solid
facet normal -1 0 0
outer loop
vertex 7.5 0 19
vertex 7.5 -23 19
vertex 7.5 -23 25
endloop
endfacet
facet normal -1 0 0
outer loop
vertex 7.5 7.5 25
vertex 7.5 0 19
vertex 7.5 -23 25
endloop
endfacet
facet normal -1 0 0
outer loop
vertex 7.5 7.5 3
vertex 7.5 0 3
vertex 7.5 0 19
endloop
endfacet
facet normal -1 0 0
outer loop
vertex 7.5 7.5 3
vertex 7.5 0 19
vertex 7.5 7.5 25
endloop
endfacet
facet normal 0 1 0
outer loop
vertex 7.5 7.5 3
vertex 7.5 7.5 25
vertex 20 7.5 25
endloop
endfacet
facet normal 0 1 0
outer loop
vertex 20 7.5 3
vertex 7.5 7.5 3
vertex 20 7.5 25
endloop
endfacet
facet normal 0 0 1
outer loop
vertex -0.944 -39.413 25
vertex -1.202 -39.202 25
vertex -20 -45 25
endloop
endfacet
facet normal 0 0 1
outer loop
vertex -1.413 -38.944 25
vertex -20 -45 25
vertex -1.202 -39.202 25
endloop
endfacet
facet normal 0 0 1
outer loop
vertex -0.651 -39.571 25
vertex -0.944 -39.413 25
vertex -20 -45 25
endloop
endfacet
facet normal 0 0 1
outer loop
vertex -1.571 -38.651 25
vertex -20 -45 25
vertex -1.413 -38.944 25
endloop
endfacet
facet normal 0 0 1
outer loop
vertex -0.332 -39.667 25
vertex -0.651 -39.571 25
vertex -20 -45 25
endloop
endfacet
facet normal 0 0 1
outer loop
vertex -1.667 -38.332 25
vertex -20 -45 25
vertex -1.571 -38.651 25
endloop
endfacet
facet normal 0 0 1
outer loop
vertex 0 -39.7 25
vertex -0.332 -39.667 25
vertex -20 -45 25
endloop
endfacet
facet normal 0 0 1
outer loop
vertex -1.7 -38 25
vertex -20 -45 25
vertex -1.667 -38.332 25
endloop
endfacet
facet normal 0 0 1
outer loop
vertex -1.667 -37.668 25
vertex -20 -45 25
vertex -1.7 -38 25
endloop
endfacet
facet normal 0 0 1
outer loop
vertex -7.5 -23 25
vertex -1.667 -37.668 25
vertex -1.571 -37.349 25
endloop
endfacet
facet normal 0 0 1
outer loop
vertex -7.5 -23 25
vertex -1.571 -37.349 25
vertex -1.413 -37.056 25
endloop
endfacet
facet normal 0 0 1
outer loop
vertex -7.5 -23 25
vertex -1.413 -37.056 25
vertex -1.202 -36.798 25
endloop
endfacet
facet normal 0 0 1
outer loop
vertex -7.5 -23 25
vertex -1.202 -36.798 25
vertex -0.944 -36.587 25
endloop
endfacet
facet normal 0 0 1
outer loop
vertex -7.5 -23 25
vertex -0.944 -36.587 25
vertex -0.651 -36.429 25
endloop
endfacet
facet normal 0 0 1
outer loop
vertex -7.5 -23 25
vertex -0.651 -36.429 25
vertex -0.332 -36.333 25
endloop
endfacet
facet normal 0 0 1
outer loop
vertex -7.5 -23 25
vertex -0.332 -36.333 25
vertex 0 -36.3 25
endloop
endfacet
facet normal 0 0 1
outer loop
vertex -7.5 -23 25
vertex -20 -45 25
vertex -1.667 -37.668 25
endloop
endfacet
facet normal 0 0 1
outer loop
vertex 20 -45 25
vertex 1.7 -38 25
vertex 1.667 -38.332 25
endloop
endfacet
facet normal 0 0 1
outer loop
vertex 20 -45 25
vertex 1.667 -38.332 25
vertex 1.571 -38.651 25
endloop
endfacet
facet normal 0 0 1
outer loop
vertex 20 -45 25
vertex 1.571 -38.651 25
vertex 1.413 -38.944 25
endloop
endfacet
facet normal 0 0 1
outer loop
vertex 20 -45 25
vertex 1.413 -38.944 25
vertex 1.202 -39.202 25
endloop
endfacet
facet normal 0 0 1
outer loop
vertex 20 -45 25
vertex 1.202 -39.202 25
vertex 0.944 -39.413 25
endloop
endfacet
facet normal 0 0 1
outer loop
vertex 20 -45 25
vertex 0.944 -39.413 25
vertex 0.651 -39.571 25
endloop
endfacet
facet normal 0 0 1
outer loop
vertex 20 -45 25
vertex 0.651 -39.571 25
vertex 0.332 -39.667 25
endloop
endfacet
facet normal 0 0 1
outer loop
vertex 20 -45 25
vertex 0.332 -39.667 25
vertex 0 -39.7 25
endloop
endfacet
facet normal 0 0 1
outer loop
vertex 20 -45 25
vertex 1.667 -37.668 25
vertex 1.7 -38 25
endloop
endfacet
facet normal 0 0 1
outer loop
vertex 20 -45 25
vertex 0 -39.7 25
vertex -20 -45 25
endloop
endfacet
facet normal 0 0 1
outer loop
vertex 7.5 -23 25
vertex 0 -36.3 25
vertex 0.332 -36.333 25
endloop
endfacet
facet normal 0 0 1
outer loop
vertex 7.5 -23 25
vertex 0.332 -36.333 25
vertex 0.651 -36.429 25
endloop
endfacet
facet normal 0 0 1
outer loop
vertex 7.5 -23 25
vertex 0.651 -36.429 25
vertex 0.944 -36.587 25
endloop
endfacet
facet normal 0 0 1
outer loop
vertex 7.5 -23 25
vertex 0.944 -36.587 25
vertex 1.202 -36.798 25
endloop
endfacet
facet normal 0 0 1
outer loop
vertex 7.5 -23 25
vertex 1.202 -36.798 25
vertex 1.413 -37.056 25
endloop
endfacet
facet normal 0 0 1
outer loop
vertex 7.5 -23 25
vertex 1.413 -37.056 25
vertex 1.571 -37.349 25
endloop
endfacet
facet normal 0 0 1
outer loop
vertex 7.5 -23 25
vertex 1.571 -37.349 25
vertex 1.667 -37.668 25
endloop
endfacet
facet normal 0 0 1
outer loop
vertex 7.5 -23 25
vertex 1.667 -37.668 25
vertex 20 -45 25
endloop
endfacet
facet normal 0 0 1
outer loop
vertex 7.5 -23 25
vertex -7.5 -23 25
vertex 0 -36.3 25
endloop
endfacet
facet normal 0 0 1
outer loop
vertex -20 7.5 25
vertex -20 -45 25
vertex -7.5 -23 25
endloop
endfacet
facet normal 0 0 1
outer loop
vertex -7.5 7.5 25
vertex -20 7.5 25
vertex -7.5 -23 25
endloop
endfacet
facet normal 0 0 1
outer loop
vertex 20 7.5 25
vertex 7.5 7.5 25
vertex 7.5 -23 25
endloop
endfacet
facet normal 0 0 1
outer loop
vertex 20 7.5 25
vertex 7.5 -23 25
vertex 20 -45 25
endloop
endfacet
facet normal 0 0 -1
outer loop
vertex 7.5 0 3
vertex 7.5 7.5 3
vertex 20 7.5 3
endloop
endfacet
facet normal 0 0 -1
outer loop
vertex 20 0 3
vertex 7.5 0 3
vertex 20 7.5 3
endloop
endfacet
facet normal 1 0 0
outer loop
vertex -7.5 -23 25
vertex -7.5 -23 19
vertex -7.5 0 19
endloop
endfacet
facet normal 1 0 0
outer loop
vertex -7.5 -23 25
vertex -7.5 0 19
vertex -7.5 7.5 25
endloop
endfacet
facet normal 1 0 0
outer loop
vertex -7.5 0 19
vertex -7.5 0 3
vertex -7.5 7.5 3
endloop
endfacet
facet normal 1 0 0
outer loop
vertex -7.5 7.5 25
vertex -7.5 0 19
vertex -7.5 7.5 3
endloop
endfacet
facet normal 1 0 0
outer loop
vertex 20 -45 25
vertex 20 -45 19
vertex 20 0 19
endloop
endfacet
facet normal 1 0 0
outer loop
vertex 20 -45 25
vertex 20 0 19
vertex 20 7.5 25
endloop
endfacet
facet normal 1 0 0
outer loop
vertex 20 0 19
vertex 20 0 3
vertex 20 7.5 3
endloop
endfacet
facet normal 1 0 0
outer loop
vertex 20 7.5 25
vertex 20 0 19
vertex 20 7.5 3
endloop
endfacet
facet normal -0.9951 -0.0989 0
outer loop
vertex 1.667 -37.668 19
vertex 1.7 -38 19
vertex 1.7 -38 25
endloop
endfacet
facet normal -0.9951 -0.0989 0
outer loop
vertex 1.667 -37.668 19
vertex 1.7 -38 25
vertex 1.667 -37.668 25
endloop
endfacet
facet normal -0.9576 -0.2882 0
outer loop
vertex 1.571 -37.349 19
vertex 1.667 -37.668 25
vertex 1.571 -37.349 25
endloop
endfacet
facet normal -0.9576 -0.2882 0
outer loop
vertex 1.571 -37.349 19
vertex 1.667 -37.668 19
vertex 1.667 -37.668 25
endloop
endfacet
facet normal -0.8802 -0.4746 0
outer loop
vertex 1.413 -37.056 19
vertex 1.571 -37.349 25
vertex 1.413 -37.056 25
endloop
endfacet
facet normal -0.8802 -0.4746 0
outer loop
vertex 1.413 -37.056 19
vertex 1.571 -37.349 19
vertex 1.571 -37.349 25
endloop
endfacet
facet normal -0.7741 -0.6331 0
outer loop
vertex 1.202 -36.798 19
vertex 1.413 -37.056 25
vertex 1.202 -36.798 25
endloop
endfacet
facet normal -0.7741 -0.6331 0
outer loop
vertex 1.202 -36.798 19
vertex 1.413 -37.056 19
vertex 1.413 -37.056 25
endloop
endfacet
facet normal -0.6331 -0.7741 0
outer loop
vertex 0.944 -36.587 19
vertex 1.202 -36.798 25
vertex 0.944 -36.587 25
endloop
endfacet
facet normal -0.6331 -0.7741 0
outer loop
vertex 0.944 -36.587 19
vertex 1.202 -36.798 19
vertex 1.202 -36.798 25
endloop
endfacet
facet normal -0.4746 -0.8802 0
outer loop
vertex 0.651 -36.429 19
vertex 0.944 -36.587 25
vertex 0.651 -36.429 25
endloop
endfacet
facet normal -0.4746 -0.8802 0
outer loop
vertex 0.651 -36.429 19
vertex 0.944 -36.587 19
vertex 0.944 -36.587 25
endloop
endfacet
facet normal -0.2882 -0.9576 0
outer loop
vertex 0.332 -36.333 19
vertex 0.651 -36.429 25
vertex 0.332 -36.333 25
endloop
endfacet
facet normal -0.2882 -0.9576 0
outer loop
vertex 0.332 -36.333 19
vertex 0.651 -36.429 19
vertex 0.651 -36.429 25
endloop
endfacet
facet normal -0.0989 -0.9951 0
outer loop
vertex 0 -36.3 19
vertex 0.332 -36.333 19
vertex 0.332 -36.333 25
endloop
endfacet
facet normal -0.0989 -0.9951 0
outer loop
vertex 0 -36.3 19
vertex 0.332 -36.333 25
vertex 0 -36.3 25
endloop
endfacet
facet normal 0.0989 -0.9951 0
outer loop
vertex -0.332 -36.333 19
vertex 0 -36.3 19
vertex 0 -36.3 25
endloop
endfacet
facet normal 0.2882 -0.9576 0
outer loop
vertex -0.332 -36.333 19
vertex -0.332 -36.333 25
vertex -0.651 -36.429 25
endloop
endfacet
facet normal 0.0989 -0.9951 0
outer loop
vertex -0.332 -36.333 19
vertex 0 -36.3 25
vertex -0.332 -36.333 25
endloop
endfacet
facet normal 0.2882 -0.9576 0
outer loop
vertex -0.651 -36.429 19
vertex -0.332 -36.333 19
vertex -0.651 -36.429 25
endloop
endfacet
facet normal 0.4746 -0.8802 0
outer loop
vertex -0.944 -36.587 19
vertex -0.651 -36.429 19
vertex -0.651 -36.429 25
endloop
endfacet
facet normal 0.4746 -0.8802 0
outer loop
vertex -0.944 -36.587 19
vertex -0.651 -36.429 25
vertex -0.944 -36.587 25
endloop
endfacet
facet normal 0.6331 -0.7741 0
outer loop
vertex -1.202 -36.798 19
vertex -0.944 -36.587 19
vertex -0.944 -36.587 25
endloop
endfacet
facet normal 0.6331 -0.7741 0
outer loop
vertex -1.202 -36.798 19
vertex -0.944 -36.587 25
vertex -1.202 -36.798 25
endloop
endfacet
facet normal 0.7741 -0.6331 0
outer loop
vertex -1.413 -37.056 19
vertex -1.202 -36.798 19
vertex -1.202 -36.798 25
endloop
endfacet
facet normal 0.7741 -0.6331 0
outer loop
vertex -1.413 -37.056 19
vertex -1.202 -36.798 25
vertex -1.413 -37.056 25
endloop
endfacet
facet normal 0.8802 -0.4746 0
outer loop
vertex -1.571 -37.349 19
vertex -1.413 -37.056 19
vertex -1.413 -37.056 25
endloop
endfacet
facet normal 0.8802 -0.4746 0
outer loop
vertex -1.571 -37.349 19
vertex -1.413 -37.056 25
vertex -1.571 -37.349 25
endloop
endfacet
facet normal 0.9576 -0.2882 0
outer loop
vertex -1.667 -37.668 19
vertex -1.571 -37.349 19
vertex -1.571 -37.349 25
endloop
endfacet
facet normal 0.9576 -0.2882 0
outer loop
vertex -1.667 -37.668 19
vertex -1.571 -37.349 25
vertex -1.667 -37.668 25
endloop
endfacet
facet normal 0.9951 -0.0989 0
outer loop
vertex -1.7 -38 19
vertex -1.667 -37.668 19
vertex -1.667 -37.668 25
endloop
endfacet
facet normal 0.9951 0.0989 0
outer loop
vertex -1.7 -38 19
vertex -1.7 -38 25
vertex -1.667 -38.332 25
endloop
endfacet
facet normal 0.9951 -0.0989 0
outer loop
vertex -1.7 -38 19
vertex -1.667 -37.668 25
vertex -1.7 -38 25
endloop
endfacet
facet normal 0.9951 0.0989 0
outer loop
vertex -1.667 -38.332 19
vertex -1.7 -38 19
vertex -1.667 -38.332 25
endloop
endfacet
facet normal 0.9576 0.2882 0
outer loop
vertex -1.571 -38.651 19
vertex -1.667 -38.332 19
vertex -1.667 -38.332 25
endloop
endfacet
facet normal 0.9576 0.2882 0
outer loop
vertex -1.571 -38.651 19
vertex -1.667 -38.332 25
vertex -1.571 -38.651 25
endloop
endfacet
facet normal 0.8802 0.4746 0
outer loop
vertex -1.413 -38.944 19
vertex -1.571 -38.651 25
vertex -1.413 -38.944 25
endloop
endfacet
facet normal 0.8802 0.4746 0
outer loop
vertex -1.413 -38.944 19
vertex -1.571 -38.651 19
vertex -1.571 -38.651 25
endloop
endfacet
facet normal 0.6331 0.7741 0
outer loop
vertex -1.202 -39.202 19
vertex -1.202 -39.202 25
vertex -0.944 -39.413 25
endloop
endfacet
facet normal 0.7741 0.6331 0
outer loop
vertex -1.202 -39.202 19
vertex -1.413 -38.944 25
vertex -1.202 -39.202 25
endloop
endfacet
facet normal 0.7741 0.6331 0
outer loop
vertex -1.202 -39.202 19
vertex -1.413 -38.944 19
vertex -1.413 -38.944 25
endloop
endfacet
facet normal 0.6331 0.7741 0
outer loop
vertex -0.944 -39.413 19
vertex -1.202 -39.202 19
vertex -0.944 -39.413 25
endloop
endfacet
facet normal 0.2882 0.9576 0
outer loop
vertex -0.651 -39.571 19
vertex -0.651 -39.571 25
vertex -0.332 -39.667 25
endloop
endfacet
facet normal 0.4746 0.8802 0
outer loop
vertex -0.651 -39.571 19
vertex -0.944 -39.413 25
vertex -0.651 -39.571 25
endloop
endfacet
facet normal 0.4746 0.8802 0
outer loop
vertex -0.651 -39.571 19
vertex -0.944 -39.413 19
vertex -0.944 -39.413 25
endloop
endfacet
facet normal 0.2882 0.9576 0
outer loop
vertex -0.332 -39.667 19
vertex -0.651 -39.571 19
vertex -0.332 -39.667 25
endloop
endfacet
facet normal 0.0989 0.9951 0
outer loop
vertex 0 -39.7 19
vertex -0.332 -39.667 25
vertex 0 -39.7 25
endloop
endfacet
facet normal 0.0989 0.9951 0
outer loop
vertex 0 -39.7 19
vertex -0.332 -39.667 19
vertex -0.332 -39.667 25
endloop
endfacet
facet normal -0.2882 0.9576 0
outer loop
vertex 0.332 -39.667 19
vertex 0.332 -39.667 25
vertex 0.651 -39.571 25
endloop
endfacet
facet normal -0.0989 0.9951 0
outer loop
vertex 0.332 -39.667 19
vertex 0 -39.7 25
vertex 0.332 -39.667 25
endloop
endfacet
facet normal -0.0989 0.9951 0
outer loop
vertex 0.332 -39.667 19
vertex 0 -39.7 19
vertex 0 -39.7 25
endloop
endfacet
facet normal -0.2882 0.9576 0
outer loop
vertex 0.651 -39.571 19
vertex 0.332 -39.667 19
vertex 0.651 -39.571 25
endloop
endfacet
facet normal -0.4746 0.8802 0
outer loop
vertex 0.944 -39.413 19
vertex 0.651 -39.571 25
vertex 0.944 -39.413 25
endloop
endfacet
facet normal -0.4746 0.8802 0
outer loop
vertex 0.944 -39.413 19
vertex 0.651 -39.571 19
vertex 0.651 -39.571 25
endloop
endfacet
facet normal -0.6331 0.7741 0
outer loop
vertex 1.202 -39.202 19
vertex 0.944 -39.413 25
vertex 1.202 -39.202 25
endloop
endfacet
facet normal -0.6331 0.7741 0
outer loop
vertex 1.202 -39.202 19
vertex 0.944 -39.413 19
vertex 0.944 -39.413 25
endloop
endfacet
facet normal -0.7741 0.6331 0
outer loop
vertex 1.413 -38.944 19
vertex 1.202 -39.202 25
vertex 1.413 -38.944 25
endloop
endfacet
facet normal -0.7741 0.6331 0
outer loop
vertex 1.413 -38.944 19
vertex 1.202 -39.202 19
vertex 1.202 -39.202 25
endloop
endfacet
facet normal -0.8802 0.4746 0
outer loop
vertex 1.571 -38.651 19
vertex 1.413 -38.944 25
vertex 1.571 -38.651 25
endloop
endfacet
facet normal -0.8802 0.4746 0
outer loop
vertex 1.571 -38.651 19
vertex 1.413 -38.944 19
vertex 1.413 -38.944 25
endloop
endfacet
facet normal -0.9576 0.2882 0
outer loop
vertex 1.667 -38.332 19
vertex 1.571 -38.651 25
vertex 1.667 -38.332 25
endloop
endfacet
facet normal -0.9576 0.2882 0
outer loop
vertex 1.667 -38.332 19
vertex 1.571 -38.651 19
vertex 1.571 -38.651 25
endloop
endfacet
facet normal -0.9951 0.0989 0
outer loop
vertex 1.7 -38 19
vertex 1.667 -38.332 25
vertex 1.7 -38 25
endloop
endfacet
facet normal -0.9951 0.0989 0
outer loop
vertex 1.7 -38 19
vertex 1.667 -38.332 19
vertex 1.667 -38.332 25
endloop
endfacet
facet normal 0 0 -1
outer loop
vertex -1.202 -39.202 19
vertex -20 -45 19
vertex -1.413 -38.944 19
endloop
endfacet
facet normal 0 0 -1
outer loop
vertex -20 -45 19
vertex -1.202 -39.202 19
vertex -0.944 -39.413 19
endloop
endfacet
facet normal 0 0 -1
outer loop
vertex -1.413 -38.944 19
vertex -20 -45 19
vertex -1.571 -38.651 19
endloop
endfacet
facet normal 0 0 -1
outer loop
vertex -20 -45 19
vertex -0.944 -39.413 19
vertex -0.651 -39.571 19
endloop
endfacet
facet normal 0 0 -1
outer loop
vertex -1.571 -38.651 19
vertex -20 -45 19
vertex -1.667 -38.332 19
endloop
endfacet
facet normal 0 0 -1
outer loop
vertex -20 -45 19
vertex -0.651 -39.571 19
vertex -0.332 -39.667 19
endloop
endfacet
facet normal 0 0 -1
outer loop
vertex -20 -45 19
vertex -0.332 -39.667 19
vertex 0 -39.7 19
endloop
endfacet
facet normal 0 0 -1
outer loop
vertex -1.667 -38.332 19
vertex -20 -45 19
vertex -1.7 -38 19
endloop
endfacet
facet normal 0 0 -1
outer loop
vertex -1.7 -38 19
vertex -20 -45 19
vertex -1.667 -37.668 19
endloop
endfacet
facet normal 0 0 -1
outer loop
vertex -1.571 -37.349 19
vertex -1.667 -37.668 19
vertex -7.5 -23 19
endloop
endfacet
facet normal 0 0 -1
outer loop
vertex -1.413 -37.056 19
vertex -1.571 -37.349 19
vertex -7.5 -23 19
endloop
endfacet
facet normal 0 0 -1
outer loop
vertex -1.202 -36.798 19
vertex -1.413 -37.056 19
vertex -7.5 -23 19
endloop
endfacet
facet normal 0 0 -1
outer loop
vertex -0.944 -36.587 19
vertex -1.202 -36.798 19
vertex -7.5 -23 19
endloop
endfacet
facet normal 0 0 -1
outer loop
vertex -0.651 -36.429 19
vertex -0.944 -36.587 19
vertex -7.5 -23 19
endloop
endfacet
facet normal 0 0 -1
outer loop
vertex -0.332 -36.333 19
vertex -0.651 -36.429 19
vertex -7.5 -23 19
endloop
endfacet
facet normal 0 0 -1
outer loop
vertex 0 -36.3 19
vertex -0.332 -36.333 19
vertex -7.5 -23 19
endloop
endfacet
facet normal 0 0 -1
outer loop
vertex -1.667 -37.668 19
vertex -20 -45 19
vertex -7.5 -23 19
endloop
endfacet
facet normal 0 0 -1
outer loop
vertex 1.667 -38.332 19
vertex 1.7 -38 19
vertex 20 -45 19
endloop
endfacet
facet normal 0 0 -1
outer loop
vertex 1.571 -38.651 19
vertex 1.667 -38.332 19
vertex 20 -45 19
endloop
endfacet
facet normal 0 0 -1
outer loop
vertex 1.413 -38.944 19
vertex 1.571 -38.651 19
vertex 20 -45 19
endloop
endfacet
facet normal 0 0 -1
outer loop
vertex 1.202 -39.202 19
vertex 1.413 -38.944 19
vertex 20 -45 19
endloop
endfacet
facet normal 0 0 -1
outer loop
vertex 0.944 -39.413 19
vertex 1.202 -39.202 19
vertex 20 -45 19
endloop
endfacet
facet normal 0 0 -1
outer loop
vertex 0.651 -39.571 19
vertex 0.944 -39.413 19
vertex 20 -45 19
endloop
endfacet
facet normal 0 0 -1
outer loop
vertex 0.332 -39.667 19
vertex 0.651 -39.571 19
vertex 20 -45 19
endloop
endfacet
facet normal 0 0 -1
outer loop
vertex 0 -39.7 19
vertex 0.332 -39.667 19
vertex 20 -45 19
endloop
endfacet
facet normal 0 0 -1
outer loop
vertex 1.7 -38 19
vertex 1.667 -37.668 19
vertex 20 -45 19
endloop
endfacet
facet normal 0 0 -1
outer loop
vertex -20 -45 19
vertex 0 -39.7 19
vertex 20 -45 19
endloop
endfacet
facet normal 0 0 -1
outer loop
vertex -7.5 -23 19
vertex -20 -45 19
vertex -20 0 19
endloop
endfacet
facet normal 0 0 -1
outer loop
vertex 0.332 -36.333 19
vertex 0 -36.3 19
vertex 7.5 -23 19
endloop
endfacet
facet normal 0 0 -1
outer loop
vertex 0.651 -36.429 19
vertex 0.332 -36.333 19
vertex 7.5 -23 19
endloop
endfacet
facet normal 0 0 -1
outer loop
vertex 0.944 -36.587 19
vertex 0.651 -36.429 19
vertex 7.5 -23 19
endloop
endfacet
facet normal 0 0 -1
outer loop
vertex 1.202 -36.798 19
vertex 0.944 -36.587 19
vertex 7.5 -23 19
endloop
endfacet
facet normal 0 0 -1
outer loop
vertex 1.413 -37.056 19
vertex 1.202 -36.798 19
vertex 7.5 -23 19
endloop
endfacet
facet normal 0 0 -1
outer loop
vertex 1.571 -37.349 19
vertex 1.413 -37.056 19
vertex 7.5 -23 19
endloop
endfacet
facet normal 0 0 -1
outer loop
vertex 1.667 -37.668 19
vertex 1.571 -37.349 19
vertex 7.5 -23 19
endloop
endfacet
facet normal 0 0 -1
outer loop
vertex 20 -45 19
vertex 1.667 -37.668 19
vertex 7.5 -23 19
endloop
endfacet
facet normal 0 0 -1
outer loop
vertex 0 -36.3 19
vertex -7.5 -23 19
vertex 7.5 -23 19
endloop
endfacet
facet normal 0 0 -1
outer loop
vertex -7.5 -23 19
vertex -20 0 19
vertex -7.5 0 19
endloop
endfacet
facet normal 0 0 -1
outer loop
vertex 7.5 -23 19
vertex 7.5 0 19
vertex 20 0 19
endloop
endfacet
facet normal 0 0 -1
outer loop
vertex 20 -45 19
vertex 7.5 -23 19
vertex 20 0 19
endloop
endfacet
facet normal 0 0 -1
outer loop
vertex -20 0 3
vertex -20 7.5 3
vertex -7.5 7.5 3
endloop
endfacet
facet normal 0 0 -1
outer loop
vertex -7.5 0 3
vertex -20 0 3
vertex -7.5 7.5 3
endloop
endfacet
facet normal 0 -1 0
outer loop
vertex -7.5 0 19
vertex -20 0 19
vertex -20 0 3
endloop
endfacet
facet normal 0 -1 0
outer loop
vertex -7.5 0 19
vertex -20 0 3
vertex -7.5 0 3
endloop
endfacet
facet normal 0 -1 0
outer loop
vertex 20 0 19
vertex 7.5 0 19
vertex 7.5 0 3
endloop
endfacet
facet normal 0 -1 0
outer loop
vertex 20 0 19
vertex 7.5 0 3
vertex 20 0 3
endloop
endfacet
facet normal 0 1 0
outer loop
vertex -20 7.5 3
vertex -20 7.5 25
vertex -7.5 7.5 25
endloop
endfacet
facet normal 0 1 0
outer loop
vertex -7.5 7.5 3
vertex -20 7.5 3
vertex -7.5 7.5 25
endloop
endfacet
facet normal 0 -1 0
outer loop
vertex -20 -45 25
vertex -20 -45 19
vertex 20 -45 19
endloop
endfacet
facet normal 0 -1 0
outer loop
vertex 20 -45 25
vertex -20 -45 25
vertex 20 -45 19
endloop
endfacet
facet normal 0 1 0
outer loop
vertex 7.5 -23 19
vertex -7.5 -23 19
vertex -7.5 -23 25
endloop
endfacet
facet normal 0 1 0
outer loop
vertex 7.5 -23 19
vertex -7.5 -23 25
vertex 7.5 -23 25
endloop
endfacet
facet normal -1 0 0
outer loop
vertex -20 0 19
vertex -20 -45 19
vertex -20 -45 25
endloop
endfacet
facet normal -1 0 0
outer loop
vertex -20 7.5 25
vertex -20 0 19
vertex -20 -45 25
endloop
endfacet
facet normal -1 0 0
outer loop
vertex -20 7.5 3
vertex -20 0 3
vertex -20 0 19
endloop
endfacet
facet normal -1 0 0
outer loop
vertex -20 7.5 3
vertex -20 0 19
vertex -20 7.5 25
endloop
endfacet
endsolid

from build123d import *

# Parameters (mm, degrees)
BOX017_W          = 12.5
BOX017_H          = 7.5
BOX017_DEPTH      = 22
BOX020_W          = 12.5
BOX020_H          = 7.5
BOX020_DEPTH      = 22
CYLINDER001_R     = 1.7
CYLINDER001_DEPTH = 30
BOX019_W          = 15
BOX019_H          = 70
BOX019_DEPTH      = 6
BOX018_W          = 40
BOX018_H          = 51
BOX018_DEPTH      = 6


with BuildPart() as cube016:
    # Box017 → Box017 (new body)
    with BuildSketch(Plane(origin=(7.5, 0, 3), x_dir=(1, 0, 0), z_dir=(0, 0, 1))):
        with Locations((6.25, 3.75)):
            Rectangle(BOX017_W, BOX017_H)
    extrude(amount=BOX017_DEPTH)


with BuildPart() as cube019:
    # Box020 → Box020 (new body)
    with BuildSketch(Plane(origin=(-20, 0, 3), x_dir=(1, 0, 0), z_dir=(0, 0, 1))):
        with Locations((6.25, 3.75)):
            Rectangle(BOX020_W, BOX020_H)
    extrude(amount=BOX020_DEPTH)


with BuildPart() as cylinder001:
    # Cylinder001 → Cylinder001 (new body)
    with BuildSketch(Plane(origin=(0, 7, 0), x_dir=(1, 0, 0), z_dir=(0, 0, 1))):
        Circle(CYLINDER001_R)
    extrude(amount=CYLINDER001_DEPTH)


with BuildPart() as cube018:
    # Box019 → Box019 (new body)
    with BuildSketch(Plane(origin=(12.5, 22, 20), x_dir=(1, 0, 0), z_dir=(0, 0, 1))):
        with Locations((7.5, 35)):
            Rectangle(BOX019_W, BOX019_H)
    extrude(amount=BOX019_DEPTH)


with BuildPart() as fusion004004:
    # Box018 → Box018 (new body)
    with BuildSketch(Plane.XY.offset(20)):
        with Locations((20, 25.5)):
            Rectangle(BOX018_W, BOX018_H)
    extrude(amount=BOX018_DEPTH)

    # Cut004013: cut Cube018
    add(cube018.part, mode=Mode.SUBTRACT)


with BuildPart() as fusion004004_1:
    # Cut004013 placement: moved
    add(fusion004004.part.moved(Location((-20, 0, -1))))

    # Cut004014: cut Cylinder001
    add(cylinder001.part, mode=Mode.SUBTRACT)


with BuildPart() as fusion004004_2:
    # Cut004014 placement: moved
    add(fusion004004_1.part.moved(Location((0, -45, 0))))

    # Fusion004004: union Cube016, Cube019
    add(cube016.part)
    add(cube019.part)


solid = fusion004004_2.part
